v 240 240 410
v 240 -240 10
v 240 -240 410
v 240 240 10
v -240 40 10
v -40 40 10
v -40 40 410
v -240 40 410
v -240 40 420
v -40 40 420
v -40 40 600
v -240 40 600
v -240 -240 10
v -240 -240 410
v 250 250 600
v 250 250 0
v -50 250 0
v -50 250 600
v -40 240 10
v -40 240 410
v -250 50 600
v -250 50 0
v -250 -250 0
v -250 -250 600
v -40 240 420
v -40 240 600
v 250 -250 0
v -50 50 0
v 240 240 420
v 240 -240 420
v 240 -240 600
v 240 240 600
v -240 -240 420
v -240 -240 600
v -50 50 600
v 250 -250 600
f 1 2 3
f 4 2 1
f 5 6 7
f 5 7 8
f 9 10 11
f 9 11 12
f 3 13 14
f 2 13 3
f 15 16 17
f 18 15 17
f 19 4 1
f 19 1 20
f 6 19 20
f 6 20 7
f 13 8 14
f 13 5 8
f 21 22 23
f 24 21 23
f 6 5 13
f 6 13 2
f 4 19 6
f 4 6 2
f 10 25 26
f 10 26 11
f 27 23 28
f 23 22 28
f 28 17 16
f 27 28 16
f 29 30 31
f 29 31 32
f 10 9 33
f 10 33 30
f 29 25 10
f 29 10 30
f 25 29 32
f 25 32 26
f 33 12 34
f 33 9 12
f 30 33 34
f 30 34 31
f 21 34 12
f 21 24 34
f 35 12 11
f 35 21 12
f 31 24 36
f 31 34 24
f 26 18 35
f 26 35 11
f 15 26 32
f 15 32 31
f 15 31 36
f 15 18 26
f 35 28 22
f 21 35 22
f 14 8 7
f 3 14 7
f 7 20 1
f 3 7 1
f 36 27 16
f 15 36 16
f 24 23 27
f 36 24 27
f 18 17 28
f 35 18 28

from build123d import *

# Parameters (mm, degrees)
F1_DEPTH = 600
F2_T     = -10
F5_DEPTH = 10


# Not quite as in the source:
# - a feature names something its author has since deleted; it is built from what else it names


with BuildPart() as f1:
    # F0 (on Top) → F1 (new body)
    with BuildSketch(Plane.XY):
        Polygon((-250, -250), (250, -250), (250, 250), (-50, 250), (-50, 50), (-250, 50), align=None)
    extrude(amount=F1_DEPTH)

    # F2
    f2_openings = [f1.faces().sort_by_distance(p)[0] for p in [
        (28.571429, -28.571429, 600),
    ]]
    offset(amount=F2_T, openings=f2_openings, kind=Kind.INTERSECTION)

    # F4 (on offset) → F5 (join)
    with BuildSketch(Plane.XY.offset(410)):
        Polygon((-240, 40), (-240, -240), (240, -240), (240, 240), (-40, 240), (-40, 40), align=None)
    extrude(amount=F5_DEPTH)


solid = f1.part
